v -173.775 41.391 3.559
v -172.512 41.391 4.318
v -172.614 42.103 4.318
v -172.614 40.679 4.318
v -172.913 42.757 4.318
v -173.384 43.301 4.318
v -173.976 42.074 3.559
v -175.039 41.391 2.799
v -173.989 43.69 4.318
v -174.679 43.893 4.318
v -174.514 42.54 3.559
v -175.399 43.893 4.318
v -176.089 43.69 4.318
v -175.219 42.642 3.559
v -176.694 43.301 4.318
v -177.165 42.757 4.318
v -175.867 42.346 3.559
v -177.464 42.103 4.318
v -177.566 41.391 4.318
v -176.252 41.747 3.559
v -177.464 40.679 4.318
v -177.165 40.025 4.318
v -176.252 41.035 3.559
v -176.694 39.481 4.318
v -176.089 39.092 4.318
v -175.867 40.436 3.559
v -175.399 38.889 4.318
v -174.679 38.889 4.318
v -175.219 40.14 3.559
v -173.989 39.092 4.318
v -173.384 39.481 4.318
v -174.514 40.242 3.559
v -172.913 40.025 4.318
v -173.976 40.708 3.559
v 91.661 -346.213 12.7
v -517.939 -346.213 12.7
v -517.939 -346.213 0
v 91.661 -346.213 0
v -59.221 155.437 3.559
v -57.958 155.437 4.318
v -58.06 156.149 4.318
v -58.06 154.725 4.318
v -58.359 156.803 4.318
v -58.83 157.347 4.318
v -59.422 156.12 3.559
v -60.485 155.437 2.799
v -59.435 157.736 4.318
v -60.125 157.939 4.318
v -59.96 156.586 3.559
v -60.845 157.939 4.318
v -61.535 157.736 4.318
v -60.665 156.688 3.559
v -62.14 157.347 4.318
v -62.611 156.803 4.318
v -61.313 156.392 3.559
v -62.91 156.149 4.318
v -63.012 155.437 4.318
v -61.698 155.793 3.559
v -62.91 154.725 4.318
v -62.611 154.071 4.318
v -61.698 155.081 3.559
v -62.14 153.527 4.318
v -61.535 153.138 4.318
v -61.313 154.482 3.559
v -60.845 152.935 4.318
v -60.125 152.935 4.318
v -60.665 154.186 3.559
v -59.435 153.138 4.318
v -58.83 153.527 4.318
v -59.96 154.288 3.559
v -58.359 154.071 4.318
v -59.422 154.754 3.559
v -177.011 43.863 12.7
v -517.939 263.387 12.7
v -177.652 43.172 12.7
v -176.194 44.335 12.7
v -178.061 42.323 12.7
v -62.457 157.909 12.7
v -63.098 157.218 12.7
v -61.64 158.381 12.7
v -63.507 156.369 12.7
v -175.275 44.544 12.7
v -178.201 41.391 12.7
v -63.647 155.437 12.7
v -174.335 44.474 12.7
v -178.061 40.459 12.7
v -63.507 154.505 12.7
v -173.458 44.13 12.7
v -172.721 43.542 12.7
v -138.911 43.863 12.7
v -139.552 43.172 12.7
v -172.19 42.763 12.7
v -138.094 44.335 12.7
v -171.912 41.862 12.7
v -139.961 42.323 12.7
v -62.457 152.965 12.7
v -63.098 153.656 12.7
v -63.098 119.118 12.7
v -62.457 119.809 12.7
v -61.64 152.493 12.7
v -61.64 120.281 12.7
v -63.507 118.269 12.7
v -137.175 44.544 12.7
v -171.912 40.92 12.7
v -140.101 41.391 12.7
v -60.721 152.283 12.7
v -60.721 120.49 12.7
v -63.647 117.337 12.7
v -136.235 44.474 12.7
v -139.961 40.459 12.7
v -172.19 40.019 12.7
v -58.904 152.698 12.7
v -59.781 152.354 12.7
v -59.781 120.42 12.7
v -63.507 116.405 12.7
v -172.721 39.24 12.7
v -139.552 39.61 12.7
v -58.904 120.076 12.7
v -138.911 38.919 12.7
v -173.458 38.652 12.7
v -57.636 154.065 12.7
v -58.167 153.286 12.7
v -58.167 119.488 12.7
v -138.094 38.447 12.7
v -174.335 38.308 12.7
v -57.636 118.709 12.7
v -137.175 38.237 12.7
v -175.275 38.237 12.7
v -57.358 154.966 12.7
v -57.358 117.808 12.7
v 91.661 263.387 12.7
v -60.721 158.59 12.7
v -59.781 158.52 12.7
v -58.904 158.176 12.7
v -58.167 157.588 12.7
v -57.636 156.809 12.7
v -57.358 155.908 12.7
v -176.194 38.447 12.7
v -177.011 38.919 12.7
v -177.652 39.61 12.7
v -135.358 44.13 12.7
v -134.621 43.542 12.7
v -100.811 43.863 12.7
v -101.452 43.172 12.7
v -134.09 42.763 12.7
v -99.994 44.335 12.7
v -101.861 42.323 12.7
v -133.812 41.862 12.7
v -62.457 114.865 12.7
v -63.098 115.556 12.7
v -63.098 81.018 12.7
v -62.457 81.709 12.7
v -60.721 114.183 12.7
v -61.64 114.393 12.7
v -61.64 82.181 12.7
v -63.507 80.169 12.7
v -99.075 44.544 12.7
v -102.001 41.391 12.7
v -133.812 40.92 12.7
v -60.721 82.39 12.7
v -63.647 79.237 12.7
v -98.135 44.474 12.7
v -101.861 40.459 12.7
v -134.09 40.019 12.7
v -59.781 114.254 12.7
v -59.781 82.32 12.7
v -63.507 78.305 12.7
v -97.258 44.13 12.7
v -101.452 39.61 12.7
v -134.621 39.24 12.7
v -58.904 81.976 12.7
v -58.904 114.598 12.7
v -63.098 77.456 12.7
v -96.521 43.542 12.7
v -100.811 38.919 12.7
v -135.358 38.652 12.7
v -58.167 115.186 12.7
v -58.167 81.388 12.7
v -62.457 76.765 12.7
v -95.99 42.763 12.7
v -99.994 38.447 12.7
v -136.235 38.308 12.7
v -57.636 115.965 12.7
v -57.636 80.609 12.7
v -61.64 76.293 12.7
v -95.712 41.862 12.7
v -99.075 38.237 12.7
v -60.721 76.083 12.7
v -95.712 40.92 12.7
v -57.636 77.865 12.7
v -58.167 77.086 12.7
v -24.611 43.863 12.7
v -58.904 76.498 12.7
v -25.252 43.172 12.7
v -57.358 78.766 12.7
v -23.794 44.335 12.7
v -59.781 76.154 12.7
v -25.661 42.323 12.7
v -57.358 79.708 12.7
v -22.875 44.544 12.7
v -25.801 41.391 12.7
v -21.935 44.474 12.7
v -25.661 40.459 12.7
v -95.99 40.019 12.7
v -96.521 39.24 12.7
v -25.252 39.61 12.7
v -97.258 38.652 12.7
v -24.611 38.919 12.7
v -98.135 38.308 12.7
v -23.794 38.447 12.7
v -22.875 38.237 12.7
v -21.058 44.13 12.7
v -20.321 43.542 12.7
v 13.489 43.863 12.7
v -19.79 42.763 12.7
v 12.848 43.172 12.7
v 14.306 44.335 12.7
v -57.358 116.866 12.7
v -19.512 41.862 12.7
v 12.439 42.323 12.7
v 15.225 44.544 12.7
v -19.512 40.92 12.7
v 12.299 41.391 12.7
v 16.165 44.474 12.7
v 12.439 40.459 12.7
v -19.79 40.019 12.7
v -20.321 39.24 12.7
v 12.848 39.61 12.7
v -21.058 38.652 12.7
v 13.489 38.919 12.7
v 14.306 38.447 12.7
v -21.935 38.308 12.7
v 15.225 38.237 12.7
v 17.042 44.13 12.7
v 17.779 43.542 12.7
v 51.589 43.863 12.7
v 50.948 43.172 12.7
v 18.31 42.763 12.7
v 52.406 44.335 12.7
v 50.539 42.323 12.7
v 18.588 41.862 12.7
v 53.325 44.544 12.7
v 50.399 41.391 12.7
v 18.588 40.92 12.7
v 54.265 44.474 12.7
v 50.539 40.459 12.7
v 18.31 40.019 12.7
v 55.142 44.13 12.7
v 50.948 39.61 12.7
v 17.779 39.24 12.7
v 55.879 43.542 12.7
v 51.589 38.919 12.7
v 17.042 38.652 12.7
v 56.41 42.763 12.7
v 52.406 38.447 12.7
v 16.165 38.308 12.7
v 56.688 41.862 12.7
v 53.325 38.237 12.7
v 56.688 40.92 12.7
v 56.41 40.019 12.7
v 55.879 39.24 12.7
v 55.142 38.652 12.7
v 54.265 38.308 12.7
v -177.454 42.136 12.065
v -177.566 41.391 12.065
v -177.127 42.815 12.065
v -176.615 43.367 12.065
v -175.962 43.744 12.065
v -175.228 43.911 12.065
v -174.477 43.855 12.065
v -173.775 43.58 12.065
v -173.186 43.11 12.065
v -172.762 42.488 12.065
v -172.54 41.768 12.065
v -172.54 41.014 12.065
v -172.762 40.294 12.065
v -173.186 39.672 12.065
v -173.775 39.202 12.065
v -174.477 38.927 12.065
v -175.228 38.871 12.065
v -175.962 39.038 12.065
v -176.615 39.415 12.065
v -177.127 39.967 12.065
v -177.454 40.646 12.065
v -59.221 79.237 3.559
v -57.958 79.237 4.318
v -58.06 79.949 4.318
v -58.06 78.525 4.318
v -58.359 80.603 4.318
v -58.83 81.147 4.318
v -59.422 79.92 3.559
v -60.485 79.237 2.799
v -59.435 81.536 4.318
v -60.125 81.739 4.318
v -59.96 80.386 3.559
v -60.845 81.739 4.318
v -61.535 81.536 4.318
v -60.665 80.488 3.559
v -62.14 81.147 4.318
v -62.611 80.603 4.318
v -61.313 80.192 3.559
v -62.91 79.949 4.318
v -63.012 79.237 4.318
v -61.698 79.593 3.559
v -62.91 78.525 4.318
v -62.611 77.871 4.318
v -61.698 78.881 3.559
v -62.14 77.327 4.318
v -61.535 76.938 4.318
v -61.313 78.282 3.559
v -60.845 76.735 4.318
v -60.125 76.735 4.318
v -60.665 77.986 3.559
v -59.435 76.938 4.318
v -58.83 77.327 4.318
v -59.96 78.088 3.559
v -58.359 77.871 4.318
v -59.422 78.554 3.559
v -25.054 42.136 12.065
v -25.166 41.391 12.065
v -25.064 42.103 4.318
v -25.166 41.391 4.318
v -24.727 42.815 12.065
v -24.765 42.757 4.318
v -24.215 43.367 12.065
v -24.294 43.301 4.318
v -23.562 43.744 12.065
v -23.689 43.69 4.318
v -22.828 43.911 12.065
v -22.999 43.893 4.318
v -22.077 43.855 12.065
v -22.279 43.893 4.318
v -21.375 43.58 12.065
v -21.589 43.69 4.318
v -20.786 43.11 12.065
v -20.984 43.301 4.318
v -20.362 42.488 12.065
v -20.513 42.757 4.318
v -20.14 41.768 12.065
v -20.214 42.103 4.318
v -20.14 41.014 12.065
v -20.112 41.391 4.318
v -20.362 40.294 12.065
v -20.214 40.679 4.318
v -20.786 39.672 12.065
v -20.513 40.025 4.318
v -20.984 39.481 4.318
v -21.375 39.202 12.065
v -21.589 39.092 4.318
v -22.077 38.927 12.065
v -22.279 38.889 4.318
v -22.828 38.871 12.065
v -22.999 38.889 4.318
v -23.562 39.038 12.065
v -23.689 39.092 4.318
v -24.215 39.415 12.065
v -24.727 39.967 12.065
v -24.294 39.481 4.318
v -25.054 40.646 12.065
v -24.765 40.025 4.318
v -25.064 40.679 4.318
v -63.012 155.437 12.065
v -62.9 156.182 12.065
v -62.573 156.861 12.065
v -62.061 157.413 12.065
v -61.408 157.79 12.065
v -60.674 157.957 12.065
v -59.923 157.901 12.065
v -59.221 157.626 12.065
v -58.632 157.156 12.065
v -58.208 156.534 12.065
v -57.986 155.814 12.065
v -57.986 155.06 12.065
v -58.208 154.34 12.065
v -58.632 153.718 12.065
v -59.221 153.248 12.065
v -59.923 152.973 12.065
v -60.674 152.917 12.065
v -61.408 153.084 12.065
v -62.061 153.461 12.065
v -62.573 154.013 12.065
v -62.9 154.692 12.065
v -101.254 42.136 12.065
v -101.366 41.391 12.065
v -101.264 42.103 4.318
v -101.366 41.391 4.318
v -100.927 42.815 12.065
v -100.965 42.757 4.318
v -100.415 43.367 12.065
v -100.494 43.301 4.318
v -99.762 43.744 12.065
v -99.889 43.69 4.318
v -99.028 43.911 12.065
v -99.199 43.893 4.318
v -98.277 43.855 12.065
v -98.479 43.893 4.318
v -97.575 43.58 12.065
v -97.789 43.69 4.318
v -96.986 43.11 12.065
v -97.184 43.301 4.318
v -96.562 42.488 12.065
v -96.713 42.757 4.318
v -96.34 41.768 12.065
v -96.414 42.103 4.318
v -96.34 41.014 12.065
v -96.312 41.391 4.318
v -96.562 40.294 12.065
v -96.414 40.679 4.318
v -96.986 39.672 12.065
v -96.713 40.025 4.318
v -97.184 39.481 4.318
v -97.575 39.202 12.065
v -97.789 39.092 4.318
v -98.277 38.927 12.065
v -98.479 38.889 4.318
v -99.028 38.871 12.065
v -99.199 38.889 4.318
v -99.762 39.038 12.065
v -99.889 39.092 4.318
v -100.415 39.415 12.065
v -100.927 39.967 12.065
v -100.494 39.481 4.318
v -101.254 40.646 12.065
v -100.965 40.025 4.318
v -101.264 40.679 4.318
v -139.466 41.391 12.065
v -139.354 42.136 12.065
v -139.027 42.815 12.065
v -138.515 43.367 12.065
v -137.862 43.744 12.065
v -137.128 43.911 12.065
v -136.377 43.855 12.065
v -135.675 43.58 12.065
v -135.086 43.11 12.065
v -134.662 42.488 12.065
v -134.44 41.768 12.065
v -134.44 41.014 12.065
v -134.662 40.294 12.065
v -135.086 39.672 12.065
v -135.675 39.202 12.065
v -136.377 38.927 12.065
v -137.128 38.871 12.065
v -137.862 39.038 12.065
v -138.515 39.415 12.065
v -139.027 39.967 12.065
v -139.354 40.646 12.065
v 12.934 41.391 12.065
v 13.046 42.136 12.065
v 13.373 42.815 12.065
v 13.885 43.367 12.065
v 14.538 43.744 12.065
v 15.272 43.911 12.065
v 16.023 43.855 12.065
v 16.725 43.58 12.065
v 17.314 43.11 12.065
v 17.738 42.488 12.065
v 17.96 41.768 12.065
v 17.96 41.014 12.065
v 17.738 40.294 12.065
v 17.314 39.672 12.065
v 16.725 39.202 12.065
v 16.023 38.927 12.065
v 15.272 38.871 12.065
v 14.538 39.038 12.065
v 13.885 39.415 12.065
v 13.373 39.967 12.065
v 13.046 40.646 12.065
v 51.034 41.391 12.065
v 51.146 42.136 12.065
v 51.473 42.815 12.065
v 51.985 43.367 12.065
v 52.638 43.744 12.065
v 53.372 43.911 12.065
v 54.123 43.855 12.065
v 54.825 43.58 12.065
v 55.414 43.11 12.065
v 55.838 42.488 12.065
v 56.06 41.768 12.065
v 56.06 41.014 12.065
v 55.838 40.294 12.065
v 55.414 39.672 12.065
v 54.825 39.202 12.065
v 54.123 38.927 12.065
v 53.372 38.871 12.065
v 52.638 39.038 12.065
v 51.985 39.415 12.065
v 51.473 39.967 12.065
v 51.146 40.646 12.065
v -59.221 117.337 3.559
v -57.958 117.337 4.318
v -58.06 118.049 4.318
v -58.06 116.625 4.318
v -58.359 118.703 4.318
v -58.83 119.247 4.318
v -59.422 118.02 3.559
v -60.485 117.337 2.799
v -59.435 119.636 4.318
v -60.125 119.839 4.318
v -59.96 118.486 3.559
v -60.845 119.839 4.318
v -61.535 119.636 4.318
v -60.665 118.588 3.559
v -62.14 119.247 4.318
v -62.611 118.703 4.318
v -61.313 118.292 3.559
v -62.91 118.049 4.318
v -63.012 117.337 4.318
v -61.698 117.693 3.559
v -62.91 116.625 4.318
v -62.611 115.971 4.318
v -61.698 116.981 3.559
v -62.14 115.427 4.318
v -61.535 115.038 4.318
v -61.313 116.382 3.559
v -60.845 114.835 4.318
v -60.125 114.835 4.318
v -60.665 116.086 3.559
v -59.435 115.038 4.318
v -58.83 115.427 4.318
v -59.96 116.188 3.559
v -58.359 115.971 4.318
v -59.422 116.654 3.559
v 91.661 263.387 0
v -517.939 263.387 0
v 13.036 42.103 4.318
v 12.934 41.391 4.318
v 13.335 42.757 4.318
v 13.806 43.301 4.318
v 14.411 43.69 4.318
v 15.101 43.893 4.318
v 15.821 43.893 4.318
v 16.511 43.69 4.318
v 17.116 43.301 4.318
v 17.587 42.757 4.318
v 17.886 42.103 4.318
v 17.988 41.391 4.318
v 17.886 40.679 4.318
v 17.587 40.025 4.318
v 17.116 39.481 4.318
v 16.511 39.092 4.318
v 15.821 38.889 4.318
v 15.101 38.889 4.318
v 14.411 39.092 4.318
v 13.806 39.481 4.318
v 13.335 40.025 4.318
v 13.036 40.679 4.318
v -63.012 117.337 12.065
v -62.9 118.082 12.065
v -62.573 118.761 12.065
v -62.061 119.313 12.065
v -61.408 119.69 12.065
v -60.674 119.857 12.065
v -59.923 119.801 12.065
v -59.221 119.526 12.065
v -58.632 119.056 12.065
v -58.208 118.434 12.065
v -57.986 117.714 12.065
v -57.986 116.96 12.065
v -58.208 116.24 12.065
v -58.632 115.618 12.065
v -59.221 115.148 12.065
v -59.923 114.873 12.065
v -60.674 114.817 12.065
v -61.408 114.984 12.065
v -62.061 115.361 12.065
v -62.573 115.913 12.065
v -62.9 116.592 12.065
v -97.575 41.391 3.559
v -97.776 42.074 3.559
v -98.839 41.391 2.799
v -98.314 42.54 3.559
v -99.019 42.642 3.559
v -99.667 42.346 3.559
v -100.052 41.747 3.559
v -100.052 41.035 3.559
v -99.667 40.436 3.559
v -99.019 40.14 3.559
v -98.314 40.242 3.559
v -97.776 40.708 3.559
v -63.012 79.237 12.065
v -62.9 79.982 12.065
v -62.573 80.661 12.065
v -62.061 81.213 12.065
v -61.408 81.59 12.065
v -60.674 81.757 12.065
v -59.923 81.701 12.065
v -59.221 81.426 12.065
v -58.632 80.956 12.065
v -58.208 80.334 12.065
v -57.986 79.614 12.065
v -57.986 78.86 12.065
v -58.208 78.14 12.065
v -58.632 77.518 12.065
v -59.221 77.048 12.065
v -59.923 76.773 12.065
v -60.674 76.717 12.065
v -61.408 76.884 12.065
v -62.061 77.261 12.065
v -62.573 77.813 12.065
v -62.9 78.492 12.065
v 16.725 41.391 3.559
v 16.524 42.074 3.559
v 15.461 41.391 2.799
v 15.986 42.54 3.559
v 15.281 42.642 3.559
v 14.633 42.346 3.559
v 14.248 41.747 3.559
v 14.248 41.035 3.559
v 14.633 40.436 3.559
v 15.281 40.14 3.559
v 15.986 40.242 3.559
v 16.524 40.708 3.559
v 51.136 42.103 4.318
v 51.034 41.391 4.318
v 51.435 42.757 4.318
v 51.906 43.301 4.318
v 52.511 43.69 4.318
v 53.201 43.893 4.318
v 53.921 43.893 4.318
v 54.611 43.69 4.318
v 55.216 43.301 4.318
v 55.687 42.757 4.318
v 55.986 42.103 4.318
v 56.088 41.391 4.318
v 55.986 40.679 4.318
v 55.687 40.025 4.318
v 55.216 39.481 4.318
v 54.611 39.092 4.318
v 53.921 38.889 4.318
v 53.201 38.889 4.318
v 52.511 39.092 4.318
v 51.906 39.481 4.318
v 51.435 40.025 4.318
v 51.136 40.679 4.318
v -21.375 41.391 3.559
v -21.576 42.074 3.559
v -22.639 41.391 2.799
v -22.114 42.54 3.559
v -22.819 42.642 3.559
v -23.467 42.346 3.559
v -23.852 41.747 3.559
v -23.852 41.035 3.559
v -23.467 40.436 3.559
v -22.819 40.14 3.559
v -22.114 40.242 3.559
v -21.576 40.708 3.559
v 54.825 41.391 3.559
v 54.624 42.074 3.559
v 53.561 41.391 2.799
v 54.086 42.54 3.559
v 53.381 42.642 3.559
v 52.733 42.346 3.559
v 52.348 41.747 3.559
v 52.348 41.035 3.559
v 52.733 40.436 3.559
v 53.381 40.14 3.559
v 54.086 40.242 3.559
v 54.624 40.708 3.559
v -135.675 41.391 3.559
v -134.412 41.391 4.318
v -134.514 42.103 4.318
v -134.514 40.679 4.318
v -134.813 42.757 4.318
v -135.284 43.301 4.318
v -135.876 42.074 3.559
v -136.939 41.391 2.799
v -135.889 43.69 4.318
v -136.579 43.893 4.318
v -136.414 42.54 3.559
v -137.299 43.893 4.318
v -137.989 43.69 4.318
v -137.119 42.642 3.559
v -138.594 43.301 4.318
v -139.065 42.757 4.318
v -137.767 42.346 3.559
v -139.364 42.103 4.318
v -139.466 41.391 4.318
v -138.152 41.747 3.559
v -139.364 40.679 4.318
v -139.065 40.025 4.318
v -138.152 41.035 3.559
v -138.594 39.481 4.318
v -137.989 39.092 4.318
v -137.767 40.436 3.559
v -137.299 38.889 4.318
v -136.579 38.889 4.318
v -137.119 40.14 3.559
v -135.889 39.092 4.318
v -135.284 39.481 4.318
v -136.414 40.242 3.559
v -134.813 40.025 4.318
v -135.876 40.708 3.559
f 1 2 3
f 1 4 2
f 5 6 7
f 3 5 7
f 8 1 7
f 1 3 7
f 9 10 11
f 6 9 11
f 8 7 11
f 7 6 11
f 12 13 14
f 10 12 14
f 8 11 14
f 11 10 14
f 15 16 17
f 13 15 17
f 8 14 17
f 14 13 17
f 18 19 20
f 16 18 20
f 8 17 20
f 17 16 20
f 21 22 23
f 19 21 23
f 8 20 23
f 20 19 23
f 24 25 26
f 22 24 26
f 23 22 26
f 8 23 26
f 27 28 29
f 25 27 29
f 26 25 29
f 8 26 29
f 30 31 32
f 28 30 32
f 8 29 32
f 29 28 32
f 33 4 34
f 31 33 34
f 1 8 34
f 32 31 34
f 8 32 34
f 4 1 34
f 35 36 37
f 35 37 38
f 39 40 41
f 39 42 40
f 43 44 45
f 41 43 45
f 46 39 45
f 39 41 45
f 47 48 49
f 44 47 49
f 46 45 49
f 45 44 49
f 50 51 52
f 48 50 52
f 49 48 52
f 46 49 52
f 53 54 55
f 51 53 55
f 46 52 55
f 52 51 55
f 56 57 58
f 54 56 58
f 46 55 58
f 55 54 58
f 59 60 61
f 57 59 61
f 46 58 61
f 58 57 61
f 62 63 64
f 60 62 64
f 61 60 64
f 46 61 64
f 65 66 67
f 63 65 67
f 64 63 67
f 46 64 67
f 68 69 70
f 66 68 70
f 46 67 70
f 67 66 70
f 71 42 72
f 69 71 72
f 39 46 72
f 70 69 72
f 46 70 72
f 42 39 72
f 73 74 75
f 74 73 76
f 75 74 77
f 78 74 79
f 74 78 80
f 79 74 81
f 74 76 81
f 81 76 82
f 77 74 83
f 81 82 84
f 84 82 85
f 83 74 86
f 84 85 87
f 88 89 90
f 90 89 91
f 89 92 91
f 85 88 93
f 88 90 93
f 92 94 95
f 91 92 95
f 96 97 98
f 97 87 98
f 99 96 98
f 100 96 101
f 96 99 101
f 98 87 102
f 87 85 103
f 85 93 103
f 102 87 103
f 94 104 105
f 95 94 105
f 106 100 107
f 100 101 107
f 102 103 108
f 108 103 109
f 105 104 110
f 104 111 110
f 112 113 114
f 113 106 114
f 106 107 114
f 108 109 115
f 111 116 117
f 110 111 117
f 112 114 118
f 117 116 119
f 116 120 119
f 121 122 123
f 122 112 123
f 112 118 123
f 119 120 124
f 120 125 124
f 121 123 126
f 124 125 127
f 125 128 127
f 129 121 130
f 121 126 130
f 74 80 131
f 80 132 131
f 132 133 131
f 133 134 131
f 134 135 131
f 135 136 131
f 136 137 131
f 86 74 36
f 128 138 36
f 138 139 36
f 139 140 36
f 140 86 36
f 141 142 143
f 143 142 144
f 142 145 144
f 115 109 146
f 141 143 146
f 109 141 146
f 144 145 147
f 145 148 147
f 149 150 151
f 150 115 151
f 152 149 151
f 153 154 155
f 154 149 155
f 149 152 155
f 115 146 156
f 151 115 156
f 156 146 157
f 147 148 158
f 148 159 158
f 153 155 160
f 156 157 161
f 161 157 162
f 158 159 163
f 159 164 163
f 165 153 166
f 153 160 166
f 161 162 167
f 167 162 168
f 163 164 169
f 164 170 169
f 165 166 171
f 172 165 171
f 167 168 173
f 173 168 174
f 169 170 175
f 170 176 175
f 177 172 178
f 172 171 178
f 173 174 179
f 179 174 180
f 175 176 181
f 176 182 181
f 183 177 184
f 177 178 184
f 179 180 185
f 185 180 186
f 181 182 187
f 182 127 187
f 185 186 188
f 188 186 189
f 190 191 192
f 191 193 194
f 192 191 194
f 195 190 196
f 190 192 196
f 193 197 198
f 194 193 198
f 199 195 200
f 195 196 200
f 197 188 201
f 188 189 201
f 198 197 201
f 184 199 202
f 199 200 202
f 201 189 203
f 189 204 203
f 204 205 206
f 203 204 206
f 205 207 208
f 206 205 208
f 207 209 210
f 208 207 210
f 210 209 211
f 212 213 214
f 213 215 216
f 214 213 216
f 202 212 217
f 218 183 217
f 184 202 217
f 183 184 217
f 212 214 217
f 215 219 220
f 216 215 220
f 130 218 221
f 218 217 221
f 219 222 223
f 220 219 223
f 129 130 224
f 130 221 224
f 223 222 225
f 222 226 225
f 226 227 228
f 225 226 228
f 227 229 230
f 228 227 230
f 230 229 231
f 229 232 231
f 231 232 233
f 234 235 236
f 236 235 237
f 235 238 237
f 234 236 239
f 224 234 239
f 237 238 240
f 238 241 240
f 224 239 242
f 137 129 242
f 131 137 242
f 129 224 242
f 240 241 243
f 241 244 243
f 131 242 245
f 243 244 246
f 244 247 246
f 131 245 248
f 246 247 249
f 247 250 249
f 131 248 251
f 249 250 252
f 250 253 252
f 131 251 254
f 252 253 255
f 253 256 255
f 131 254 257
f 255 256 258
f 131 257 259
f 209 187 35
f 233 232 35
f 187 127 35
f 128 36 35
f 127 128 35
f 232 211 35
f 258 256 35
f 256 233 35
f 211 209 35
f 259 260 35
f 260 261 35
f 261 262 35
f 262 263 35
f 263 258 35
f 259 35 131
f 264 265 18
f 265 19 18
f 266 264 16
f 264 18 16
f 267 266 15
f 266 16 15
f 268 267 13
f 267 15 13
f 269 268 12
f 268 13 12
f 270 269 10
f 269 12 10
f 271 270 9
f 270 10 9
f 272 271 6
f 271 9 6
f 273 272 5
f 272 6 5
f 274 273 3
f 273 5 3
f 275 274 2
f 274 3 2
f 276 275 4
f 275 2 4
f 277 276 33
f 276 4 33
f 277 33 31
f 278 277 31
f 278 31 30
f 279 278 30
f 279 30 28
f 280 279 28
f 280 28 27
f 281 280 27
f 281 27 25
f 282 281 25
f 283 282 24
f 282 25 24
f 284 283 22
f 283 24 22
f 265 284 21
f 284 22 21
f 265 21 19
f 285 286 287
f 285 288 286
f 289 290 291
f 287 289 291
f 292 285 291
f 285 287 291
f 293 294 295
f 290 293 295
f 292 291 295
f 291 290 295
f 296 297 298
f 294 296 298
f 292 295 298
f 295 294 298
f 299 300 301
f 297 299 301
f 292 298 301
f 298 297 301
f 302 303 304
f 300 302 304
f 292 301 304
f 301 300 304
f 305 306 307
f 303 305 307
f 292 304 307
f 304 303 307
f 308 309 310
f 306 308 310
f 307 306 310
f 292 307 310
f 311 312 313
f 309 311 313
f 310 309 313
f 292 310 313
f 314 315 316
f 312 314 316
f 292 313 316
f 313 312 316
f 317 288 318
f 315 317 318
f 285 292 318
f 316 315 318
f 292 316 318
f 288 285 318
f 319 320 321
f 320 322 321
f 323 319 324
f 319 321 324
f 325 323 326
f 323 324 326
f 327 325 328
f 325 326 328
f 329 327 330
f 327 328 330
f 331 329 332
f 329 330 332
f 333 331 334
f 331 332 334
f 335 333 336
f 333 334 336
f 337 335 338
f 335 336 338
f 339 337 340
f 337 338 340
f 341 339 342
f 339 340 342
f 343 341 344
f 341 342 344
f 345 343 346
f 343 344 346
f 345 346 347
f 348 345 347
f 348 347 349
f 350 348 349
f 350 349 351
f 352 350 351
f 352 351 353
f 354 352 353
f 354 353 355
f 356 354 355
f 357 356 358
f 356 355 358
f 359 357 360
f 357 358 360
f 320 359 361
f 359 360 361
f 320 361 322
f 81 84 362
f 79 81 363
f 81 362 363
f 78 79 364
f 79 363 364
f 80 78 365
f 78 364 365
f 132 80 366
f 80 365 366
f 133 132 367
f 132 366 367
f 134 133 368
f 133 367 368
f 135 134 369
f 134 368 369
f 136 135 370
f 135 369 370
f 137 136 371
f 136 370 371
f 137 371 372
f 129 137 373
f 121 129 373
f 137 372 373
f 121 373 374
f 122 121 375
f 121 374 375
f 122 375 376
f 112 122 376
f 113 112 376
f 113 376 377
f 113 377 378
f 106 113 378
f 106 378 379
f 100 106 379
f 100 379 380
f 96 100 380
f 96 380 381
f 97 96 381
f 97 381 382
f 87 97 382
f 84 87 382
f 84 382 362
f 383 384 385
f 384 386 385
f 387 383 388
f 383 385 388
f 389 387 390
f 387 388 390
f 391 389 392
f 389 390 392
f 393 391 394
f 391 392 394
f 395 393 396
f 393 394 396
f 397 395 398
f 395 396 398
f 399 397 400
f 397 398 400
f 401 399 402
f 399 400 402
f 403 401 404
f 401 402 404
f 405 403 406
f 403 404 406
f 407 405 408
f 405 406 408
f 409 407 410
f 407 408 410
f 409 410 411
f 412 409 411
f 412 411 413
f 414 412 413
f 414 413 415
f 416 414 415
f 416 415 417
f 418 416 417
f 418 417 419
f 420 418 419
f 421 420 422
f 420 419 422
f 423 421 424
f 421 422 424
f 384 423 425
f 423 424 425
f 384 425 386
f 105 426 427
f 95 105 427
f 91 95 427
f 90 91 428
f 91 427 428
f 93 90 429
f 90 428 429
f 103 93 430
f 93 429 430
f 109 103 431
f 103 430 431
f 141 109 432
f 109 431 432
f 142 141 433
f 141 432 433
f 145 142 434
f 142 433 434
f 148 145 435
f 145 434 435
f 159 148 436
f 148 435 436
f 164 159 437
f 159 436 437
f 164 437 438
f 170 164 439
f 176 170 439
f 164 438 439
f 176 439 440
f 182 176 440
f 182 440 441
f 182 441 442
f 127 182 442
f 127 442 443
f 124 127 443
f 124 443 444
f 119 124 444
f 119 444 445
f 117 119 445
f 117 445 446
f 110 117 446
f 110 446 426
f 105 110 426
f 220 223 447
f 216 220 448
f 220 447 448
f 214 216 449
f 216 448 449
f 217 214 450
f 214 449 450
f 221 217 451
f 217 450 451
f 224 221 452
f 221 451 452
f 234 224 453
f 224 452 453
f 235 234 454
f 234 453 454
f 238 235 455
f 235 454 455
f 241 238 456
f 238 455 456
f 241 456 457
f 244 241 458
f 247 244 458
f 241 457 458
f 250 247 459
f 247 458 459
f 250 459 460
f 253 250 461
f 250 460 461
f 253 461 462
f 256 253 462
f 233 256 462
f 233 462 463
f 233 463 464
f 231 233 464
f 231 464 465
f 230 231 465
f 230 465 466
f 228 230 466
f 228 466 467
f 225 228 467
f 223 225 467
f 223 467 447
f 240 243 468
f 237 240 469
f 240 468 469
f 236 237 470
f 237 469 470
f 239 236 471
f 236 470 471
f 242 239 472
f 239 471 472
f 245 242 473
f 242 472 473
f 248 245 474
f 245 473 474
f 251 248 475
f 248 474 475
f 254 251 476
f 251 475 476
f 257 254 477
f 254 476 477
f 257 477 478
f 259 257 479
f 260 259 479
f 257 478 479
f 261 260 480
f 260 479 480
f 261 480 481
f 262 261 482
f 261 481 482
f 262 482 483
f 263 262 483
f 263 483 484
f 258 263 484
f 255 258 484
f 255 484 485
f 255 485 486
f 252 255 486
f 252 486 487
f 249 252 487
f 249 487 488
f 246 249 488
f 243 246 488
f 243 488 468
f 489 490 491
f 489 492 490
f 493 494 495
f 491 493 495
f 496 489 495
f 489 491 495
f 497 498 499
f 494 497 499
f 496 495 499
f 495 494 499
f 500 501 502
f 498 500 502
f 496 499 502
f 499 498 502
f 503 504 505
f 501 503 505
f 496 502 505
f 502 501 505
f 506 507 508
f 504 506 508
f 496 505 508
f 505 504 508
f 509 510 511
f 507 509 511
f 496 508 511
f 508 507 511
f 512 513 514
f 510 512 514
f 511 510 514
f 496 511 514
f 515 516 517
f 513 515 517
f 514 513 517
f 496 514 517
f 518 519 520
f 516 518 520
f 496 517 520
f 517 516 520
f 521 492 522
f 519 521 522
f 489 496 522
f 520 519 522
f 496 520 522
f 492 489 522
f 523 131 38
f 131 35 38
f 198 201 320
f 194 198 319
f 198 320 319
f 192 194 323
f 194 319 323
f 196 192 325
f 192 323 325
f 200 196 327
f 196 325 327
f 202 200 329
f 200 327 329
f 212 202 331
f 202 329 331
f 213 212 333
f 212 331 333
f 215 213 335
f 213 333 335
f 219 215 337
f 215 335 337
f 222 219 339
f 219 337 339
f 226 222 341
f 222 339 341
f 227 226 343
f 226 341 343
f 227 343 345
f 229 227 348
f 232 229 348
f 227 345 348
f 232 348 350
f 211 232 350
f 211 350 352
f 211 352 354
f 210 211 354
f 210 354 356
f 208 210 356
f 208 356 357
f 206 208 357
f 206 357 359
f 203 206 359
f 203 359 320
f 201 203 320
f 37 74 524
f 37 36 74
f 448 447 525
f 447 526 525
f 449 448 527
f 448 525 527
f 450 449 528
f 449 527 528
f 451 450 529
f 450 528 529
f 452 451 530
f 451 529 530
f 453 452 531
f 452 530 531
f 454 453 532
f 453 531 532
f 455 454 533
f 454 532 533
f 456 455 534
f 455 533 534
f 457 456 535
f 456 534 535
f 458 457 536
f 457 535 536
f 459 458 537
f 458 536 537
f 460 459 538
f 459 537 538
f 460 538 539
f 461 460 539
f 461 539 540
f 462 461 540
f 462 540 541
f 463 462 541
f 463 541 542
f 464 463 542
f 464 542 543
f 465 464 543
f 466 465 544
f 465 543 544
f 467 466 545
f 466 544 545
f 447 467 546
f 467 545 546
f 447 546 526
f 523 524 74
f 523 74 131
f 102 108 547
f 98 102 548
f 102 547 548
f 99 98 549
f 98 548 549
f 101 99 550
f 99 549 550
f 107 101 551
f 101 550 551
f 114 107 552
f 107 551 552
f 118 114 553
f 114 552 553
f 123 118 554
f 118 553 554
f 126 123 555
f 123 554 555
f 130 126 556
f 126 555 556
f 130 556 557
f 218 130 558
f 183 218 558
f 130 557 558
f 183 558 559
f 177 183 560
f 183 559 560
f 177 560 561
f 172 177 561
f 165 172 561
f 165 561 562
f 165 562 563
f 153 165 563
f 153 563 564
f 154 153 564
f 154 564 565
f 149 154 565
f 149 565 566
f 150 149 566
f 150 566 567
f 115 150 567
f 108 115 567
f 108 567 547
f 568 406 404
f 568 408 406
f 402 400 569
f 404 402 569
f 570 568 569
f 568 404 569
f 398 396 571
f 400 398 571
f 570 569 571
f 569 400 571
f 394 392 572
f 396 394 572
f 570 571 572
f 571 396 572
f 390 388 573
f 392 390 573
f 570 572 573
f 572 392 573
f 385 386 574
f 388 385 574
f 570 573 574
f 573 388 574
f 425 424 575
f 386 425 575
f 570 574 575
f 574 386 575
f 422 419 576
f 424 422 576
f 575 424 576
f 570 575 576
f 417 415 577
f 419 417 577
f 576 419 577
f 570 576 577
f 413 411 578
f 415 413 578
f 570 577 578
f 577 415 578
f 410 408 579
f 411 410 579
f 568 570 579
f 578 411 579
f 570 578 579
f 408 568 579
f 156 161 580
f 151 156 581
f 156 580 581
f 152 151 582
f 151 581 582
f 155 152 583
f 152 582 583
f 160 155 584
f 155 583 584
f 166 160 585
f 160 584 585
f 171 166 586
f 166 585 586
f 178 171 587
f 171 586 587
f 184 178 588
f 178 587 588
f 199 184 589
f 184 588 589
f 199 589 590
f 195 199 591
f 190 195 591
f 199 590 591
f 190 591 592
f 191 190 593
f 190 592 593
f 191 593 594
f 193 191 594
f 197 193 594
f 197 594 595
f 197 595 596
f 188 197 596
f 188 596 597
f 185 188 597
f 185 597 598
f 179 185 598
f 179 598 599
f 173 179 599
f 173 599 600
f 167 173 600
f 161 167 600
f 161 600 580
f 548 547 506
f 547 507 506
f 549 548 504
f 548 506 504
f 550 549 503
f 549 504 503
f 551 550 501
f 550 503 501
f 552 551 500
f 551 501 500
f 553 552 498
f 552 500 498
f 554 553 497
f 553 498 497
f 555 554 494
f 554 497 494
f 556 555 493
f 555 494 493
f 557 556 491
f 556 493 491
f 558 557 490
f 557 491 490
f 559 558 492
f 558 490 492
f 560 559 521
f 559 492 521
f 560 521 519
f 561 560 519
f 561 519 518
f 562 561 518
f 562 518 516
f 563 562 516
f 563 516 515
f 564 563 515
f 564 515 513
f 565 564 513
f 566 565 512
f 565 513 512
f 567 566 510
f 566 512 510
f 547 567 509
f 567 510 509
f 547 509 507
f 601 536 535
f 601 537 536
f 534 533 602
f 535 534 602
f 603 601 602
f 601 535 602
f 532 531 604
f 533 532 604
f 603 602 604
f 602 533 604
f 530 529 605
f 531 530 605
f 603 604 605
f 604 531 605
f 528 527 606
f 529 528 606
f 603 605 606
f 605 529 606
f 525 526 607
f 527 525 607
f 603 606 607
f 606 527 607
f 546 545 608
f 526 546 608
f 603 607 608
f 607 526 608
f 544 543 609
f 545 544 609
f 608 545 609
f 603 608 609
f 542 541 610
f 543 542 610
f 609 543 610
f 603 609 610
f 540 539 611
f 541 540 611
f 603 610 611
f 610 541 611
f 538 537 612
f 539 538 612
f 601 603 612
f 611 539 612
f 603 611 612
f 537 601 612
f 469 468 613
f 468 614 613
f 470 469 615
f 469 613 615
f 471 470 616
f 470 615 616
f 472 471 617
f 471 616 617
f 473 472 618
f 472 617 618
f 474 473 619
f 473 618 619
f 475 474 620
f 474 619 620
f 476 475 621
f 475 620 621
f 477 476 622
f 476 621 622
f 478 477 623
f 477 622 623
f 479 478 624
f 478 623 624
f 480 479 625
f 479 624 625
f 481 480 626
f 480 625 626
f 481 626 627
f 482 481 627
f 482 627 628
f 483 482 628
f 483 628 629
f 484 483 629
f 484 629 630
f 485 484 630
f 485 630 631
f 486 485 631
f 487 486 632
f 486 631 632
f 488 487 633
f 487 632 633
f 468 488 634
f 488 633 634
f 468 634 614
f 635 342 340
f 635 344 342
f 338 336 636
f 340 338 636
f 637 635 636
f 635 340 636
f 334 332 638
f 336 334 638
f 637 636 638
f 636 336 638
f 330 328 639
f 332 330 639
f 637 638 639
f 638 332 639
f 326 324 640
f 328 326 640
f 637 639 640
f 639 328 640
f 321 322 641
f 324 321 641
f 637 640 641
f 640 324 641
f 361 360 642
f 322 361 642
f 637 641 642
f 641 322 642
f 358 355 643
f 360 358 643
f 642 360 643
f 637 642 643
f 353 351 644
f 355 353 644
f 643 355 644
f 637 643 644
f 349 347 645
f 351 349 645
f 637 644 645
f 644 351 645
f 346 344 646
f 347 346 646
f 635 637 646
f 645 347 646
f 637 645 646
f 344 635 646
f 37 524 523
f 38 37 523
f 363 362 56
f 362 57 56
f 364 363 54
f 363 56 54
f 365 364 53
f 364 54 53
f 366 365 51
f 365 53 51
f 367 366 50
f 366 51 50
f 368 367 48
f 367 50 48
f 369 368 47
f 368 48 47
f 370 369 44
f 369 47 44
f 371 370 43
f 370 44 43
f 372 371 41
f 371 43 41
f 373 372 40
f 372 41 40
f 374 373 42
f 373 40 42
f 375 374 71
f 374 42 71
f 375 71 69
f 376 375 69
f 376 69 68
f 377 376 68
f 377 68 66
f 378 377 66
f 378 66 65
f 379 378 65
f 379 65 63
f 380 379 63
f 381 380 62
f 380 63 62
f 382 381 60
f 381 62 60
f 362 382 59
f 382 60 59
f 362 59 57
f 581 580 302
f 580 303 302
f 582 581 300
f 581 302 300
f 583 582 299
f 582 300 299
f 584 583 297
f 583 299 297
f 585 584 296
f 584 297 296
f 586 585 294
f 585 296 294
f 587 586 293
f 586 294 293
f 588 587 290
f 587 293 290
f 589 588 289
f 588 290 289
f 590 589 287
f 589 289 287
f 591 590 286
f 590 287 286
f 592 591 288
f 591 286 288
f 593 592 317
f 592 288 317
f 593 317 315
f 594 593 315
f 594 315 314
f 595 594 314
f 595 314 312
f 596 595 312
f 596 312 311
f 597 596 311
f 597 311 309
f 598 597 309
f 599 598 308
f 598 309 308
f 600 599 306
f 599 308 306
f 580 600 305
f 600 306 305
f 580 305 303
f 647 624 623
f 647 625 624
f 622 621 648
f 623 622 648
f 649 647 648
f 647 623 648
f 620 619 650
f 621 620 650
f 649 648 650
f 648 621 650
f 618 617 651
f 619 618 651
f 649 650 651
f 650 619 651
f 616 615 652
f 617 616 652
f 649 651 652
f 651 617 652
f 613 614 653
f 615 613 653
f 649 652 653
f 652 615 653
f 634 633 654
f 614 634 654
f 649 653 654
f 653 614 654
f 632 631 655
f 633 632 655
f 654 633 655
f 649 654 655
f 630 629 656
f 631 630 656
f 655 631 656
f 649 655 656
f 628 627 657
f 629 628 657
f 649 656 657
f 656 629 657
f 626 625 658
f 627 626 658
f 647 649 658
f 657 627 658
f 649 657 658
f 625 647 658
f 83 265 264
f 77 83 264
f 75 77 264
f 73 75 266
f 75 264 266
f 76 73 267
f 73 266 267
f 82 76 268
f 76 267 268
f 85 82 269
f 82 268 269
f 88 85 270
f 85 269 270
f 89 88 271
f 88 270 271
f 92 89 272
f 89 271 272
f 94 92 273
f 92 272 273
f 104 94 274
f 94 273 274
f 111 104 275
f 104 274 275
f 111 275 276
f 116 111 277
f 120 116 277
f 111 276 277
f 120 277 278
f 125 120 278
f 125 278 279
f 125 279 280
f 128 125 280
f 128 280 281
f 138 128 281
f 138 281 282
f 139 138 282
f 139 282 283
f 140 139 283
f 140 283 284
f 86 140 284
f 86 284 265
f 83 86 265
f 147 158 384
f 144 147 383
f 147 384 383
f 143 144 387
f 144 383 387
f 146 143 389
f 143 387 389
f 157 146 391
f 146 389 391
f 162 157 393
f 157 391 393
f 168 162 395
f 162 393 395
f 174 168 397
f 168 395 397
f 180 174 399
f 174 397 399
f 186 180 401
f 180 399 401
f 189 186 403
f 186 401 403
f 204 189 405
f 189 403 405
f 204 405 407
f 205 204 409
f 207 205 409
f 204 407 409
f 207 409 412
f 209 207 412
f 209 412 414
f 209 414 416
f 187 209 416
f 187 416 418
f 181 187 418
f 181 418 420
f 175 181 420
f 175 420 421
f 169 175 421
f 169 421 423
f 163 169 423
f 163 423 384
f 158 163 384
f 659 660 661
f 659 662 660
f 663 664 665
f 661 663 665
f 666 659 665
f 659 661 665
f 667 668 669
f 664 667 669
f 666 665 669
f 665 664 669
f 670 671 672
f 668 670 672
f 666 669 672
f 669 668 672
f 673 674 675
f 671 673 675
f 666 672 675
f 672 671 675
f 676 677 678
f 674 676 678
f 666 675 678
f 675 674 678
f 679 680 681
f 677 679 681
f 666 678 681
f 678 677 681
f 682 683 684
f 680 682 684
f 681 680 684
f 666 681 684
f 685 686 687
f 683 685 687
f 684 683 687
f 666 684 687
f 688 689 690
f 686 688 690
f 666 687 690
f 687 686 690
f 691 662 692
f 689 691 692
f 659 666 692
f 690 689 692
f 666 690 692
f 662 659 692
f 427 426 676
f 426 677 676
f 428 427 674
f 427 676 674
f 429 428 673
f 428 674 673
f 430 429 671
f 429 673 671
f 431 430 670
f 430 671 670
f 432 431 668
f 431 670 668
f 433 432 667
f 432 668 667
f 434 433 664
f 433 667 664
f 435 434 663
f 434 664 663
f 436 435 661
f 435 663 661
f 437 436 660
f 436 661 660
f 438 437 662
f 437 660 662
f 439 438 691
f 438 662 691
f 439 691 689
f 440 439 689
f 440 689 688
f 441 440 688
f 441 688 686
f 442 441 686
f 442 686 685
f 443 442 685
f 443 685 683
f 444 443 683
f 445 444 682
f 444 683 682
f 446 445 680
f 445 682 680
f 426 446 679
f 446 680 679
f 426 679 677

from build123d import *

# Parameters (mm, degrees)
SKETCH1_W                            = 304.8
SKETCH1_H                            = 304.8
BOSS_EXTRUDE1_DEPTH                  = 12.7
SKETCH2_W                            = 12.7
SKETCH2_H                            = 304.8
BOSS_EXTRUDE2_DEPTH                  = 304.8
SKETCH3_W                            = 609.6
SKETCH3_H                            = 12.7
BOSS_EXTRUDE3_DEPTH                  = 254
SKETCH4_W                            = 609.6
SKETCH4_H                            = 12.7
BOSS_EXTRUDE4_DEPTH                  = 50.8
F_8_0_199_DIAMETER_HOLE2_D           = 5.0546
F_8_0_199_DIAMETER_HOLE2_DEPTH       = 8.382
F_8_0_199_DIAMETER_HOLE2_CSINK_D     = 6.3246
F_8_0_199_DIAMETER_HOLE2_CSINK_ANGLE = 90
F_8_0_199_DIAMETER_HOLE2_TIP         = 1.518555042


with BuildPart() as part:
    # Sketch1 → Boss-Extrude1 (new body)
    with BuildSketch(Plane.XY):
        with Locations((-60.739130435, 60.186956522)):
            Rectangle(SKETCH1_W, SKETCH1_H)
    extrude(amount=BOSS_EXTRUDE1_DEPTH)

    # Sketch2 → Boss-Extrude2 (add)
    with BuildSketch(Plane.ZY.offset(213.139130435)):
        with Locations((6.35, 60.186956522)):
            Rectangle(SKETCH2_W, SKETCH2_H)
    extrude(amount=BOSS_EXTRUDE2_DEPTH)

    # Sketch3 → Boss-Extrude3 (add)
    with BuildSketch(Plane.XZ.offset(92.213043478)):
        with Locations((-213.139130435, 6.35)):
            Rectangle(SKETCH3_W, SKETCH3_H)
    extrude(amount=BOSS_EXTRUDE3_DEPTH)

    # Sketch4 → Boss-Extrude4 (add)
    with BuildSketch(Plane(origin=(0, 212.586956522, 0), x_dir=(1, 0, 0), z_dir=(0, 1, 0))):
        with Locations((-213.139130435, -6.35)):
            Rectangle(SKETCH4_W, SKETCH4_H)
    extrude(amount=BOSS_EXTRUDE4_DEPTH)

    # #8 (0.199) Diameter Hole2
    with Locations(Plane.XY.offset(12.7)):
        with Locations((53.560869565, 41.390956522), (15.460869565, 41.390956522), (-22.639130435, 41.390956522), (-98.839130435, 41.390956522), (-136.939130435, 41.390956522), (-175.039130435, 41.390956522), (-60.485130435, 79.236956522), (-60.485130435, 117.336956522), (-60.485130435, 155.436956522)):
            CounterSinkHole(F_8_0_199_DIAMETER_HOLE2_D / 2, F_8_0_199_DIAMETER_HOLE2_CSINK_D / 2, depth=F_8_0_199_DIAMETER_HOLE2_DEPTH, counter_sink_angle=F_8_0_199_DIAMETER_HOLE2_CSINK_ANGLE)
            with Locations((0, 0, -(F_8_0_199_DIAMETER_HOLE2_DEPTH + F_8_0_199_DIAMETER_HOLE2_TIP / 2))):  # 118° drill point
                Cone(0, F_8_0_199_DIAMETER_HOLE2_D / 2, F_8_0_199_DIAMETER_HOLE2_TIP, mode=Mode.SUBTRACT)


solid = part.part
